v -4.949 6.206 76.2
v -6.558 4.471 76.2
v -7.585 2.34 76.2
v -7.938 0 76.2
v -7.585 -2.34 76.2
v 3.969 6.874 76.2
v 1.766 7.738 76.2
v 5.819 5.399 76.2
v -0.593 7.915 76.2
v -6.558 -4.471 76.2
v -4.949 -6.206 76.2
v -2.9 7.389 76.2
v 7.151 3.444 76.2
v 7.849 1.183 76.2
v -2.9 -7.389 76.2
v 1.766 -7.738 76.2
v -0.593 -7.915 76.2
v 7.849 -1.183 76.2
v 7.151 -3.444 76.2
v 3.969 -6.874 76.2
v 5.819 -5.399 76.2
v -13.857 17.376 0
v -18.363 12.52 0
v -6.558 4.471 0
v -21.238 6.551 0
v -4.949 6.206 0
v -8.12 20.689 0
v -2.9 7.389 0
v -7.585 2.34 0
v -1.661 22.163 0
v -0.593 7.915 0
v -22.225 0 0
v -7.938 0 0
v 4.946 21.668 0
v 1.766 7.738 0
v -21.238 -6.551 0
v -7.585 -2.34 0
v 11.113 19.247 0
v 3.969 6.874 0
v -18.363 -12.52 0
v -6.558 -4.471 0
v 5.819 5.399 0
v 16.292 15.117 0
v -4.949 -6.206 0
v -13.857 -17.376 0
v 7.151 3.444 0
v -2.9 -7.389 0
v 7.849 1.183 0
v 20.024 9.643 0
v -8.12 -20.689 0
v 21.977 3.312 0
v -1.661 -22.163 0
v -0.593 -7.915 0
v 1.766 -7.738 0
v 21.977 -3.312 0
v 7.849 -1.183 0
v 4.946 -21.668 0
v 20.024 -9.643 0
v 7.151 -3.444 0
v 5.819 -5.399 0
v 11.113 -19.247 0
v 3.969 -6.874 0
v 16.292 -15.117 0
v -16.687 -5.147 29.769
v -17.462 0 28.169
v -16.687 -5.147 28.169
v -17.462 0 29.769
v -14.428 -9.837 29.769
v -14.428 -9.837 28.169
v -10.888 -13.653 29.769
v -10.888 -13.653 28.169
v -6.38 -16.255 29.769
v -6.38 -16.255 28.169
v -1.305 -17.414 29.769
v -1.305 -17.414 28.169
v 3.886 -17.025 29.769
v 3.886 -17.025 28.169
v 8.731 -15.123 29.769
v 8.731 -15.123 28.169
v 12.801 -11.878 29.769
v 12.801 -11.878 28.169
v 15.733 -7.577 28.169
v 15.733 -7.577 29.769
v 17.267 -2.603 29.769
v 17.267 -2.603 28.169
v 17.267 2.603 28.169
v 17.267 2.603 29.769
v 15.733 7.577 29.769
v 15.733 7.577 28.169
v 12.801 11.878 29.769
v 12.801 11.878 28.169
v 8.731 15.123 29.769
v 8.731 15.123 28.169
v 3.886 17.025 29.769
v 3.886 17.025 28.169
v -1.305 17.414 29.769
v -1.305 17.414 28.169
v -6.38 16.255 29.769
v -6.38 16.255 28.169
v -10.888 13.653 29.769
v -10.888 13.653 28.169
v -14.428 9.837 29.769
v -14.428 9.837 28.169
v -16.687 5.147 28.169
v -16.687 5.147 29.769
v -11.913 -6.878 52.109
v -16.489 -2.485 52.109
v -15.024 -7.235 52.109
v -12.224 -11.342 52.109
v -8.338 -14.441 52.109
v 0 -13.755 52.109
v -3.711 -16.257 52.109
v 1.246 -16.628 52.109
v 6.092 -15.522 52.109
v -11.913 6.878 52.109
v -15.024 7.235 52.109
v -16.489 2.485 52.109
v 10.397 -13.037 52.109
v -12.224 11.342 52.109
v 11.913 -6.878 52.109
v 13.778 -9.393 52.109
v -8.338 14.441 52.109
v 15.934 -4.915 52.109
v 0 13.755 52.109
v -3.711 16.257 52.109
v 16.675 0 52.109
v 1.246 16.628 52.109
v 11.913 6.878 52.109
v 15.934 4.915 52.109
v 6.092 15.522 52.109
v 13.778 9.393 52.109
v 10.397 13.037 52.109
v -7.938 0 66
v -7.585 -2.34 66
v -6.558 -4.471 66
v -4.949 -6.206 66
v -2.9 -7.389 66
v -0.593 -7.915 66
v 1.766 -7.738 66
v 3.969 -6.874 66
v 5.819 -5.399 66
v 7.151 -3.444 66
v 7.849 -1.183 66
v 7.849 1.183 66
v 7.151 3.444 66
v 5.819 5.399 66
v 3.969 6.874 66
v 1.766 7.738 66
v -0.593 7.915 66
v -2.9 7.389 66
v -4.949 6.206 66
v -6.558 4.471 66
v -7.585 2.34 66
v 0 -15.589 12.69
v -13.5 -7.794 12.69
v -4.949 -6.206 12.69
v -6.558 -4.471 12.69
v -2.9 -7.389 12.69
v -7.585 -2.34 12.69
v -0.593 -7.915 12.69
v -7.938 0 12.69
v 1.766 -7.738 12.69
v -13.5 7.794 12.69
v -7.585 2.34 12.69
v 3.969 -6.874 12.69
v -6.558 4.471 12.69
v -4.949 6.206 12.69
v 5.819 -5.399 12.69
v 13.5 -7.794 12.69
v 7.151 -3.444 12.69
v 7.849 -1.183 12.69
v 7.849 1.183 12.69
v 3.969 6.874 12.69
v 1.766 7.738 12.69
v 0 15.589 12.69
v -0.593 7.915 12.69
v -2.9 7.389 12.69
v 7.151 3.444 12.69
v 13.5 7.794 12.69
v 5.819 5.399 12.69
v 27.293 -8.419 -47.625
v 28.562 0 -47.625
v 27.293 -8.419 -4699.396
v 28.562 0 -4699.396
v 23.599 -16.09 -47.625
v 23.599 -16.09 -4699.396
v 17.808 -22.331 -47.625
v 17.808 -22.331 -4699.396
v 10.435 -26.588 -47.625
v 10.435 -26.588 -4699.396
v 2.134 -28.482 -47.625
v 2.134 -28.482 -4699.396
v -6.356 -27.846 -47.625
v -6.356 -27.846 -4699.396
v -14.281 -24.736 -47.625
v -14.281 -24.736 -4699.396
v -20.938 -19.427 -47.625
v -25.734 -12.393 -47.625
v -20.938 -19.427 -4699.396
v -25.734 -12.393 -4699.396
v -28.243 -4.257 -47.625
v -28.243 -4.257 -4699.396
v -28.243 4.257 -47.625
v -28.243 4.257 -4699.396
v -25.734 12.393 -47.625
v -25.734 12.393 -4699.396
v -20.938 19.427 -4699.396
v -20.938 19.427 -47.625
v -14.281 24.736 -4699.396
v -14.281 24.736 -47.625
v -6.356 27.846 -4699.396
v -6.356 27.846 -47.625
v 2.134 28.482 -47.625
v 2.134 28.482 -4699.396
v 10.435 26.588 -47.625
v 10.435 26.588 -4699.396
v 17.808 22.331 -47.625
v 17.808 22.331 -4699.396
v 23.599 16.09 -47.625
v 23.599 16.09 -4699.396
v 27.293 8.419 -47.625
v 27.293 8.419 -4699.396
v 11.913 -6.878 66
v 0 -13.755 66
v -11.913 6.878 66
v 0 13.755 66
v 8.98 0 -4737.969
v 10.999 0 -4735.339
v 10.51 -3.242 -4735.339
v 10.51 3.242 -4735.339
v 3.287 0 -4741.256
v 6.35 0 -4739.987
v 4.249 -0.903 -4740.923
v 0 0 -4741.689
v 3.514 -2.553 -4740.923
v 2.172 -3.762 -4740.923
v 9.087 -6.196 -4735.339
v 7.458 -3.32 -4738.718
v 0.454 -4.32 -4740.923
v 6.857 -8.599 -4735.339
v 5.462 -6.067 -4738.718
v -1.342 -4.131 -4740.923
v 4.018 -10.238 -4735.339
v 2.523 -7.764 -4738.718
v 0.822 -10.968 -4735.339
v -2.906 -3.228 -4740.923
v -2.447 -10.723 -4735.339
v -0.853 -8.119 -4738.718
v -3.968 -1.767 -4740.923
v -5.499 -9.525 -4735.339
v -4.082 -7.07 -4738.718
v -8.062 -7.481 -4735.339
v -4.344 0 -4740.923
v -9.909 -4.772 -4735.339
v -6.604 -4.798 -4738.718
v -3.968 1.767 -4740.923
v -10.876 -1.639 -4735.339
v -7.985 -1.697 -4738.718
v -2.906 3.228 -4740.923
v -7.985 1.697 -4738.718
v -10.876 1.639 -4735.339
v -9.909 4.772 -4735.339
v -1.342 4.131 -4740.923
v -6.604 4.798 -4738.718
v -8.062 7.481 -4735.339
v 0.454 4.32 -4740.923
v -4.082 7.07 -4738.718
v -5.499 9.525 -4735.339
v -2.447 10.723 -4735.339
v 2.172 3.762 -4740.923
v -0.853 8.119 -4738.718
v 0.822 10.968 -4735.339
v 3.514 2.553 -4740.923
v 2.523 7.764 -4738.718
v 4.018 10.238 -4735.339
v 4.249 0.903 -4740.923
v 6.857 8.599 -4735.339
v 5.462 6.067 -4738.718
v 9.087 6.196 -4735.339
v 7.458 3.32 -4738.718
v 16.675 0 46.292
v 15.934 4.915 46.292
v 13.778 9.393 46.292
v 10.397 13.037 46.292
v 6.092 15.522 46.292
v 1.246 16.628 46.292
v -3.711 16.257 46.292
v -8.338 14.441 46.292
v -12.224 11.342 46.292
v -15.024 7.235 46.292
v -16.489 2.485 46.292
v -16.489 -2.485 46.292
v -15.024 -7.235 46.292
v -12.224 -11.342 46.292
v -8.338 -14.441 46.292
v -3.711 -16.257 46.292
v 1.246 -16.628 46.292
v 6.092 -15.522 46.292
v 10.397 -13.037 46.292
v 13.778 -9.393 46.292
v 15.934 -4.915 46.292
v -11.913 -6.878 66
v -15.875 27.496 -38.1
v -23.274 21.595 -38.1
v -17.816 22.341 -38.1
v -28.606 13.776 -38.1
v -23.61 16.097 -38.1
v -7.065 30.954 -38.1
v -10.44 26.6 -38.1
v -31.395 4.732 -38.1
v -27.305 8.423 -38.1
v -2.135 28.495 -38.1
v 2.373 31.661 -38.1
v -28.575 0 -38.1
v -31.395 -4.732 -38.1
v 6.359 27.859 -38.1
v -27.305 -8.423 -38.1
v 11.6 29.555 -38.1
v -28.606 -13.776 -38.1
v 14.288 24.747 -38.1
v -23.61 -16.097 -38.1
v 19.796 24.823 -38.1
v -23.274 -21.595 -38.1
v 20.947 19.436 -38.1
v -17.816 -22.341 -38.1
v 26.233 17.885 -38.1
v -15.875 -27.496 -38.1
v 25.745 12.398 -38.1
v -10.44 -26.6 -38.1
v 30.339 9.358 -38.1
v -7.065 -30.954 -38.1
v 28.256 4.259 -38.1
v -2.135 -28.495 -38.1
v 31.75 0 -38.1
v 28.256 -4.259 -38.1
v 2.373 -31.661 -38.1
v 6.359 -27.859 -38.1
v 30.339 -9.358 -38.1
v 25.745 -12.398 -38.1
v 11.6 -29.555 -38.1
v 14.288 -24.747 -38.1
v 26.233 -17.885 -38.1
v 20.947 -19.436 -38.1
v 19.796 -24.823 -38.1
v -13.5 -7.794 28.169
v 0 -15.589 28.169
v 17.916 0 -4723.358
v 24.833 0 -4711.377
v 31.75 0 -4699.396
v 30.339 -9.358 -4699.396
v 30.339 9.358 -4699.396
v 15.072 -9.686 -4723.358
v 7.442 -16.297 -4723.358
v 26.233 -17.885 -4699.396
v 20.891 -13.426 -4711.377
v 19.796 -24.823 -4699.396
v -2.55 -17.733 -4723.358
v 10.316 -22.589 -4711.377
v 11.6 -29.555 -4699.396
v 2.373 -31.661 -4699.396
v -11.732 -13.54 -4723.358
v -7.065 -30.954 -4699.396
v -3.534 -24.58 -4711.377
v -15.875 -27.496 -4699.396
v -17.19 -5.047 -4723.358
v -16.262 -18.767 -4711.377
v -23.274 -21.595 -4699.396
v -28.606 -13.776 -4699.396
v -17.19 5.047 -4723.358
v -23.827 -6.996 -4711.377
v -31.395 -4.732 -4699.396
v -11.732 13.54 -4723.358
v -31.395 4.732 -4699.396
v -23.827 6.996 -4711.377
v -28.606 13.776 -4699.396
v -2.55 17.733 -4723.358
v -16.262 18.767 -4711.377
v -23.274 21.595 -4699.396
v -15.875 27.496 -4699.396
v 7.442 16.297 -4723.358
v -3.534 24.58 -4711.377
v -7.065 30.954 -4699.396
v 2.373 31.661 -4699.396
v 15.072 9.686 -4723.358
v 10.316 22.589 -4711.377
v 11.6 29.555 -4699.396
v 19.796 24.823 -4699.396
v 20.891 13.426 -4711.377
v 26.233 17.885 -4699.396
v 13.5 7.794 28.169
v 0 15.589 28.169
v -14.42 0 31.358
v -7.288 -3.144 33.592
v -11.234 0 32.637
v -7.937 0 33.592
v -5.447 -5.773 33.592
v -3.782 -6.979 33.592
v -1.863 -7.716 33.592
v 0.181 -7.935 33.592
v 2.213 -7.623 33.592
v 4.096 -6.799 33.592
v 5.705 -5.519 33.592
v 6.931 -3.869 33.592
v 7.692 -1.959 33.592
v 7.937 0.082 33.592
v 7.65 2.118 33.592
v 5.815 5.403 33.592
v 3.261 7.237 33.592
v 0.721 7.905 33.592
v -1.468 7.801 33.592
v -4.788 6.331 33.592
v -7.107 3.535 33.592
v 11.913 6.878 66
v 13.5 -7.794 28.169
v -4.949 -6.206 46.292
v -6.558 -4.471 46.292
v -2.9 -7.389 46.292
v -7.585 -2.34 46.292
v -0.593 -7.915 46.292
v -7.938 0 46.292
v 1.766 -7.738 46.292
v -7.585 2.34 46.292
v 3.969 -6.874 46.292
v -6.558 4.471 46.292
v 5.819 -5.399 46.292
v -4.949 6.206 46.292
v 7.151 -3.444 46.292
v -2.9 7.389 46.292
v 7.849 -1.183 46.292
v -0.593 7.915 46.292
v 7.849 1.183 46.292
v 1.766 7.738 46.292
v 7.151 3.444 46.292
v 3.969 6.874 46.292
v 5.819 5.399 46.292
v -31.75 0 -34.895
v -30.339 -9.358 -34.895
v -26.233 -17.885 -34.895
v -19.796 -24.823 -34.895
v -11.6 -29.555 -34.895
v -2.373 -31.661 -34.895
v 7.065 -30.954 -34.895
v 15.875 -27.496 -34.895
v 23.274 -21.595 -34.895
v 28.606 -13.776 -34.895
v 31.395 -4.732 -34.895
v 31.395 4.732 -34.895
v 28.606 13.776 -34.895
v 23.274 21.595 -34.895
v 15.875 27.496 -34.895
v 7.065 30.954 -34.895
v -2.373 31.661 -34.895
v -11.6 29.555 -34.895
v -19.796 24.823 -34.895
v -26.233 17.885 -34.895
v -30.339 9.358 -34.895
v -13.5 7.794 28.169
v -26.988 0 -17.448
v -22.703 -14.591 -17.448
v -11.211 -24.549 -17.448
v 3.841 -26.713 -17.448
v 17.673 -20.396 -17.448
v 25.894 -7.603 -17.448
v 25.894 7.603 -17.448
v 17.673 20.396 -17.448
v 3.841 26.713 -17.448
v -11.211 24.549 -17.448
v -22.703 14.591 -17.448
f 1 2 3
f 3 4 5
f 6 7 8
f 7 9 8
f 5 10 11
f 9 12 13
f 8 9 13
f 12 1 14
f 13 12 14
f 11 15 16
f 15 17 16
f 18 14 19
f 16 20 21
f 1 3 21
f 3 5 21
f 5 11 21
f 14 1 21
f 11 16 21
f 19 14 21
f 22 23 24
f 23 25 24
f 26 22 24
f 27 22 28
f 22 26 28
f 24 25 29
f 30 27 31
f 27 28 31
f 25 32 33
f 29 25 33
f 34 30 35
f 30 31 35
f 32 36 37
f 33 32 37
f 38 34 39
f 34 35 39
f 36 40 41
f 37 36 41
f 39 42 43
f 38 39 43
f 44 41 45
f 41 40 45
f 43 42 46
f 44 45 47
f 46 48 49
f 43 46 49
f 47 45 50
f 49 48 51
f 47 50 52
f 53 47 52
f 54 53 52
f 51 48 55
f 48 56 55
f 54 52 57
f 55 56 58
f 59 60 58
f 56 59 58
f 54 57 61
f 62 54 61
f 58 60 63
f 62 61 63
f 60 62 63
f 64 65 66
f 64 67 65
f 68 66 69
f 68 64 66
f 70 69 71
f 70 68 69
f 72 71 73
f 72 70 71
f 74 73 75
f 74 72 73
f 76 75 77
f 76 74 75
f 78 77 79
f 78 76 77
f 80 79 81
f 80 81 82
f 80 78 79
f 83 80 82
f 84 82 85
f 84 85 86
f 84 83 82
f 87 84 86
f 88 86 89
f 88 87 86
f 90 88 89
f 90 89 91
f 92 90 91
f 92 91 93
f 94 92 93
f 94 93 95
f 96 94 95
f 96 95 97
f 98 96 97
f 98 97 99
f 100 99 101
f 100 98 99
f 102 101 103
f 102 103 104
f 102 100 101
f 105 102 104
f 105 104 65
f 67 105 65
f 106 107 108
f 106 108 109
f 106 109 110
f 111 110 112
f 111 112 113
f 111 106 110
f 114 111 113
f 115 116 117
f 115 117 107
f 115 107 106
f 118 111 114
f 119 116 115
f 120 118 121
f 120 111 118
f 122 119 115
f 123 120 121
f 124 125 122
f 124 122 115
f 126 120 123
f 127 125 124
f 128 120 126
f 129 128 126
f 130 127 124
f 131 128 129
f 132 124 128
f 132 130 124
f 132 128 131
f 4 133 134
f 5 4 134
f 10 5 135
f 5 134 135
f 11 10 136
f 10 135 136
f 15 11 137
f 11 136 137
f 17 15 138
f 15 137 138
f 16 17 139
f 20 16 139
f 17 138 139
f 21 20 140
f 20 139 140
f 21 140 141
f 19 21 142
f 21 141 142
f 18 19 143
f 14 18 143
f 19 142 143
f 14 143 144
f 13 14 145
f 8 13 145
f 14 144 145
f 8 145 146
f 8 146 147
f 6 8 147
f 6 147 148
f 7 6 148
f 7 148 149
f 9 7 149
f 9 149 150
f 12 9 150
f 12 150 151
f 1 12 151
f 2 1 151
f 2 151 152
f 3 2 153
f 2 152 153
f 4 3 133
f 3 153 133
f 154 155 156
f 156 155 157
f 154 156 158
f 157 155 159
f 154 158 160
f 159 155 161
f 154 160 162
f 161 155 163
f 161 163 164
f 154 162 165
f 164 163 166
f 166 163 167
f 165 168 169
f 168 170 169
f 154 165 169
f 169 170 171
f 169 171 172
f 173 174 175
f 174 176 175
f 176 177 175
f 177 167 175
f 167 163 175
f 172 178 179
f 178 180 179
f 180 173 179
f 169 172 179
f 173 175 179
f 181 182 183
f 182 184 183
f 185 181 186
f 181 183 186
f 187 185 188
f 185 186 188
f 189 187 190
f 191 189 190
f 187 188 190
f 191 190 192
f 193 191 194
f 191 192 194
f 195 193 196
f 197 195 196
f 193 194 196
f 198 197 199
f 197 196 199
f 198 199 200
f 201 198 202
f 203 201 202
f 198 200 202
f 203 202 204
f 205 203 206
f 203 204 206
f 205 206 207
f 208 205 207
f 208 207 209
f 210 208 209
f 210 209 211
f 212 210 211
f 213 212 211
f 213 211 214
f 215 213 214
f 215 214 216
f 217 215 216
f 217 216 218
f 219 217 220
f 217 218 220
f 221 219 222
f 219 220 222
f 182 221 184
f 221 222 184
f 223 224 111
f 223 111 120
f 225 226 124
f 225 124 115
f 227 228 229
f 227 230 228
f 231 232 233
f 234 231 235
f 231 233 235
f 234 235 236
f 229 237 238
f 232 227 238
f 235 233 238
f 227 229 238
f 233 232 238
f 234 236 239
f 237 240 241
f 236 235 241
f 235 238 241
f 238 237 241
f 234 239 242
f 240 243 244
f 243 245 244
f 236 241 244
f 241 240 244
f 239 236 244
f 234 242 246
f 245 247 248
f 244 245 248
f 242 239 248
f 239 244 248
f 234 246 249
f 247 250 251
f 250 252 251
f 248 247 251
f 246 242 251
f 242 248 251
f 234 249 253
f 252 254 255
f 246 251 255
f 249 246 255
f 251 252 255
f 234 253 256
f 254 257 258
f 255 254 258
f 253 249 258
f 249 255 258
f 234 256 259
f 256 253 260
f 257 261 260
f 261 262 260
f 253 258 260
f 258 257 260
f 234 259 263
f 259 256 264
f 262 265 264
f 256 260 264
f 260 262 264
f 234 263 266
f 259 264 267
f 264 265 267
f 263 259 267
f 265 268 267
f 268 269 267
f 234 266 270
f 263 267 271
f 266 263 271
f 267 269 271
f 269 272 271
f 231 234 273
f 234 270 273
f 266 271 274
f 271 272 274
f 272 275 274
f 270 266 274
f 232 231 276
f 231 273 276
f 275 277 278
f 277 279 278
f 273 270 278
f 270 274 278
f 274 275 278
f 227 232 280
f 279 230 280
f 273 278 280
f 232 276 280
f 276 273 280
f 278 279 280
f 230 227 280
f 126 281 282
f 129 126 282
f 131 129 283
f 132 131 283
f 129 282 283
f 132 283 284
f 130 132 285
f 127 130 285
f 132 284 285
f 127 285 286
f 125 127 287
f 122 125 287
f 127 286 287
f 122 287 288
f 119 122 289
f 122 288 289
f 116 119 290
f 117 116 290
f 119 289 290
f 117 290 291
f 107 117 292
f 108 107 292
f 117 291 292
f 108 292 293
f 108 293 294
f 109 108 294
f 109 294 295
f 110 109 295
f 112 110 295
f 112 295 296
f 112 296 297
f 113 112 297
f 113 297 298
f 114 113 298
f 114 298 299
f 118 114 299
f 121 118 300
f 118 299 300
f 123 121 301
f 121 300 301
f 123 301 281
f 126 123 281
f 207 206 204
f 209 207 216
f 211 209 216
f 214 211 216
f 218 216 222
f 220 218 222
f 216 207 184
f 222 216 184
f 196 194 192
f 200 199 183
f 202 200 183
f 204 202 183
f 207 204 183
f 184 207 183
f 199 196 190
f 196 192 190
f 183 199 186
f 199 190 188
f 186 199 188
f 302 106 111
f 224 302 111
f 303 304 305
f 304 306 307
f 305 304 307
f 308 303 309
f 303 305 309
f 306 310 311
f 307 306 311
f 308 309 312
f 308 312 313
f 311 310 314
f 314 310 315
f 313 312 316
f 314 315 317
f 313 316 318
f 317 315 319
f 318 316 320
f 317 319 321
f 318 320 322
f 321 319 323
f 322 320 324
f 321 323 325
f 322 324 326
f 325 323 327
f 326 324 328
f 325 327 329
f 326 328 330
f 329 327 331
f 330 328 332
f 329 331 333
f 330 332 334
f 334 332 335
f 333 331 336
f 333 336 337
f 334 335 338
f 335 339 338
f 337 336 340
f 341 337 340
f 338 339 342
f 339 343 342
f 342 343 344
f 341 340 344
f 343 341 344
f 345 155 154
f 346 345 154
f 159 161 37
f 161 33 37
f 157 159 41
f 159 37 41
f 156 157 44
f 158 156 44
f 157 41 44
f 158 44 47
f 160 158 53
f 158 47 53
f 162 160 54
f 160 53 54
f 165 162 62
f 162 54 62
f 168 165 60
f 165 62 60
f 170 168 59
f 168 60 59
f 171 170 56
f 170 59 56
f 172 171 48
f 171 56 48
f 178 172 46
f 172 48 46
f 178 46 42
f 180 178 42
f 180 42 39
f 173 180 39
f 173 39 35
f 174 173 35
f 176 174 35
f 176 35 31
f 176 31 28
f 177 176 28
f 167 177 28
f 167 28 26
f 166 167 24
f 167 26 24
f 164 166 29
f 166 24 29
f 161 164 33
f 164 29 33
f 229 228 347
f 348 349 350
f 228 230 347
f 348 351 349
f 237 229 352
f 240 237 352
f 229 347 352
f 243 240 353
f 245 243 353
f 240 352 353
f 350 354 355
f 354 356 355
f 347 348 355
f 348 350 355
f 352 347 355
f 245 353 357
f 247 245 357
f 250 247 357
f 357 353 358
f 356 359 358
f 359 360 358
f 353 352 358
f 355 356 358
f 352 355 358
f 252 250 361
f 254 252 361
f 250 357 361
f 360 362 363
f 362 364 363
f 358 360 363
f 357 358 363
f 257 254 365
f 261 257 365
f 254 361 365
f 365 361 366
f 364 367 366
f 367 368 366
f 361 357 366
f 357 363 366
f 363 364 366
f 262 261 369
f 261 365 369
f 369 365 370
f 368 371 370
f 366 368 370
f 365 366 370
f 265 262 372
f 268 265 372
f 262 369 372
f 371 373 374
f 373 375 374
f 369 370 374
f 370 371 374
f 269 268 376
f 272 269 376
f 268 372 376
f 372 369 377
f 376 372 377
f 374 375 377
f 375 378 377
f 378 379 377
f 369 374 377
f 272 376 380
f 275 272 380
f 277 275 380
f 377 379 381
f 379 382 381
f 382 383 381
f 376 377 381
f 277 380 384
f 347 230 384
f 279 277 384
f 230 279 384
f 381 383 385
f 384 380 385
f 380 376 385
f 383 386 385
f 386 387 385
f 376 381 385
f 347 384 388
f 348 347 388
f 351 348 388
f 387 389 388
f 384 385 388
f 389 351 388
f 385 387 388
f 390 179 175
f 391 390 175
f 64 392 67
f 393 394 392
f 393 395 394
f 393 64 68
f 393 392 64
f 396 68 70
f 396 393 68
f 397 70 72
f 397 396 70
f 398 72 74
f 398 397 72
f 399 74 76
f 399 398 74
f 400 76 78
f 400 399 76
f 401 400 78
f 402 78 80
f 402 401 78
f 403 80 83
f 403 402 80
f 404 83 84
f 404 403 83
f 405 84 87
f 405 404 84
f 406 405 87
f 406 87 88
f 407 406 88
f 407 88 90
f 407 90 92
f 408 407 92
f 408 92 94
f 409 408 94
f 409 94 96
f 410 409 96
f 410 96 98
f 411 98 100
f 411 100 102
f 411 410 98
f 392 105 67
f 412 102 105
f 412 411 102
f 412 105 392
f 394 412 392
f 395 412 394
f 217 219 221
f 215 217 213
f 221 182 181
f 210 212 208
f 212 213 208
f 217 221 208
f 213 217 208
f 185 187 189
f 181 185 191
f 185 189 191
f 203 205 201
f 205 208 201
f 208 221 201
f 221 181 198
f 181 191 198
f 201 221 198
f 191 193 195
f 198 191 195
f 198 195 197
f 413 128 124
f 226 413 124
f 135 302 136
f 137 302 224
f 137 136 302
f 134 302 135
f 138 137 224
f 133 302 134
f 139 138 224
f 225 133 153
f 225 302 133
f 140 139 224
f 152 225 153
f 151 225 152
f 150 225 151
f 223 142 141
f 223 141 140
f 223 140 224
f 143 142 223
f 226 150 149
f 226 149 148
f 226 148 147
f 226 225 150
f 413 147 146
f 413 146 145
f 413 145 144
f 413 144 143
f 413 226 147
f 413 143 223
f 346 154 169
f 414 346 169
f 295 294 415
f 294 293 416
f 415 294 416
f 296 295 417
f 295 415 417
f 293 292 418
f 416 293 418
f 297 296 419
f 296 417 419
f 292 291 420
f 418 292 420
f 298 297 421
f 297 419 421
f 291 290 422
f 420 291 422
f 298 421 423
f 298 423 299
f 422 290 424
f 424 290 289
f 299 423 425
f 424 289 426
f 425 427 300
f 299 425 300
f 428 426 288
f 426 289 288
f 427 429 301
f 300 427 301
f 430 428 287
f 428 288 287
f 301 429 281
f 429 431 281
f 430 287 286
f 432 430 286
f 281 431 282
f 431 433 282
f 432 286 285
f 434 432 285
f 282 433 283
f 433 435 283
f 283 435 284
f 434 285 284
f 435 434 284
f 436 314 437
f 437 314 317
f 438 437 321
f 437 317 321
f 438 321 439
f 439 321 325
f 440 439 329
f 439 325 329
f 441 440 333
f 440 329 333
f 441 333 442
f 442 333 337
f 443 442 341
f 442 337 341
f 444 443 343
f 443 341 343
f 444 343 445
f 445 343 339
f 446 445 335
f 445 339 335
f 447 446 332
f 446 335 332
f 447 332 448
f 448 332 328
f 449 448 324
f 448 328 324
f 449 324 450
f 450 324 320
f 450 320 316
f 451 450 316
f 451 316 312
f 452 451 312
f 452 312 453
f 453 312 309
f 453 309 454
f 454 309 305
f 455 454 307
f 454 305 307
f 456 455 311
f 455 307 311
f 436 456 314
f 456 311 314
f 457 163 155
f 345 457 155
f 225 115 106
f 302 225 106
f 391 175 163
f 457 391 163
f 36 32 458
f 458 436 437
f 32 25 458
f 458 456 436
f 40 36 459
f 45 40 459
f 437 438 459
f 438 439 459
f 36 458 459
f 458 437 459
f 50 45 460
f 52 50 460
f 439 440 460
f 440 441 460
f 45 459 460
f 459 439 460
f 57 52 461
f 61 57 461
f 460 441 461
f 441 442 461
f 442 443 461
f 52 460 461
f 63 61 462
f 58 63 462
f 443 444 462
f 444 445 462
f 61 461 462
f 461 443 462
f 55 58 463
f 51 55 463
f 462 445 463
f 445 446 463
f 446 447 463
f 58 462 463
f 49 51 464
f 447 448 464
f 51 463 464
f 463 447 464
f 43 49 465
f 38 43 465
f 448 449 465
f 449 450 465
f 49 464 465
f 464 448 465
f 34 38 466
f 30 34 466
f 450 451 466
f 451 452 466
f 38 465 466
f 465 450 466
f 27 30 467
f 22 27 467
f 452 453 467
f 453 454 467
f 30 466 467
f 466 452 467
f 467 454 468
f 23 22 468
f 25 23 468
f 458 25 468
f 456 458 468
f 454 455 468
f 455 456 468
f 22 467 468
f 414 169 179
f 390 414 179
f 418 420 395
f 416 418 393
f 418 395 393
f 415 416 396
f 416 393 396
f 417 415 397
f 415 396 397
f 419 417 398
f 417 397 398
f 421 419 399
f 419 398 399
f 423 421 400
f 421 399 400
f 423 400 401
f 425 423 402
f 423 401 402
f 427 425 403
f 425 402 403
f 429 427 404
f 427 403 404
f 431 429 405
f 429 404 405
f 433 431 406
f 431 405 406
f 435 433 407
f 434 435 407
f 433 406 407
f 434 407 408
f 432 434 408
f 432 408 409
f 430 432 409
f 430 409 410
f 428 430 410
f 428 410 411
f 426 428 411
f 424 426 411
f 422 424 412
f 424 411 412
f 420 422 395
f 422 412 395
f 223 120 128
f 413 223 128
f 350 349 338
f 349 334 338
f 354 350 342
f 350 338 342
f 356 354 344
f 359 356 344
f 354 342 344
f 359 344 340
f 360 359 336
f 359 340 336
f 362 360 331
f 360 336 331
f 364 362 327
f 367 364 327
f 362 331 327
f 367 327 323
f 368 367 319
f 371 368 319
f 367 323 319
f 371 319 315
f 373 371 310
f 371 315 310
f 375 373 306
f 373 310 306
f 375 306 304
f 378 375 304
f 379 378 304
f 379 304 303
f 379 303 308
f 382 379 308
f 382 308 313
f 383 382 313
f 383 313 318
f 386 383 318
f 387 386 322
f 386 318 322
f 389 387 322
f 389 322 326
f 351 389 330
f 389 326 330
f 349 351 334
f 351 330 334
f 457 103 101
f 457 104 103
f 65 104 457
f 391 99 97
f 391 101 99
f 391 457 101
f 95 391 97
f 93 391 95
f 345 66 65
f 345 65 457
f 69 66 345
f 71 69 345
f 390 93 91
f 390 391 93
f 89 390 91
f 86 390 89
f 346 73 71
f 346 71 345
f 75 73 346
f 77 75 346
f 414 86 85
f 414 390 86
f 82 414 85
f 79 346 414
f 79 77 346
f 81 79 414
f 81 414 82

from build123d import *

# Parameters (mm, degrees)
BOSS_REVOLVE3_START         = 12.690475
BOSS_REVOLVE3_OUTLINE_R     = 7.9375
BOSS_REVOLVE3_DEPTH         = 15.478125
BOSS_REVOLVE3_START_2       = 46.292398399
BOSS_REVOLVE3_2_OUTLINE_R   = 16.6751
BOSS_REVOLVE3_2_OUTLINE_R_2 = 7.9375
BOSS_REVOLVE3_2_DEPTH       = 5.8166
BOSS_EXTRUDE2_DEPTH         = 13.890625


# Read off the part's stored shape, not the designer's step: Boss-Revolve3
with BuildPart() as part:
    # Sketch1 → Base-Revolve (revolve)
    with BuildSketch(Plane(origin=(0, 0, 0), x_dir=(0, 0, -1), z_dir=(1, 0, 0)), mode=Mode.PRIVATE) as base_revolve_sk:
        Polygon((-76.2, 0), (-76.2, 7.9375), (0, 7.9375), (0, 22.225), (34.895210283, 31.75), (38.1, 28.575), (47.625, 28.575), (47.625, 0), align=None)
    revolve(base_revolve_sk.sketch.rotate(Axis((0, 0, 0), (0, 0, 1)), 90), axis=Axis((0, 0, 0), (0, 0, 1)))

    # Sketch3 → Boss-Revolve2 (revolve)
    with BuildSketch(Plane(origin=(0, 0, 0), x_dir=(0, 0, -1), z_dir=(1, 0, 0)), mode=Mode.PRIVATE) as boss_revolve2_sk:
        with BuildLine():
            Line((-28.1686, 0), (-28.1686, 17.4625))
            Line((-28.1686, 17.4625), (-29.7688, 17.4625))
            ThreePointArc((-29.7688, 17.4625), (-33.309963658, 9.048473715), (-34.5186, 0))
            Line((-34.5186, 0), (-28.1686, 0))
        make_face()
    revolve(boss_revolve2_sk.sketch.rotate(Axis((0, 0, 0), (0, 0, 1)), 90), axis=Axis((0, 0, 0), (0, 0, 1)))

    # Sketch2 → Boss-Revolve1 (revolve)
    with BuildSketch(Plane(origin=(0, 0, 0), x_dir=(0, 0, -1), z_dir=(1, 0, 0)), mode=Mode.PRIVATE) as boss_revolve1_sk:
        with BuildLine():
            Line((38.1, 31.75), (38.1, 28.5623))
            Line((38.1, 28.5623), (4699.39623629, 28.5623))
            Line((4699.39623629, 28.5623), (4699.39623629, 0))
            Line((4699.39623629, 0), (4741.68884943, 0))
            ThreePointArc((4741.68884943, 0), (4739.987372059, 6.35), (4735.33884943, 10.998522628))
            Line((4735.33884943, 10.998522628), (4699.39623629, 31.75))
            Line((4699.39623629, 31.75), (38.1, 31.75))
        make_face()
    revolve(boss_revolve1_sk.sketch.rotate(Axis((0, 0, 29.7434), (0, 0, -1)), 90), axis=Axis((0, 0, 29.7434), (0, 0, -1)))

    # Boss-Revolve3 outline → Boss-Revolve3 (add)
    with BuildSketch(Plane.XY.offset(BOSS_REVOLVE3_START)):
        Polygon((0, -15.588572738), (13.5001, -7.794286369), (13.5001, 7.794286369), (0, 15.588572738), (-13.5001, 7.794286369), (-13.5001, -7.794286369), align=None)
        Circle(BOSS_REVOLVE3_OUTLINE_R, mode=Mode.SUBTRACT)
    extrude(amount=BOSS_REVOLVE3_DEPTH)

    # Boss-Revolve3 2 outline → Boss-Revolve3 2 (add)
    with BuildSketch(Plane.XY.offset(BOSS_REVOLVE3_START_2)):
        Circle(BOSS_REVOLVE3_2_OUTLINE_R)
        Circle(BOSS_REVOLVE3_2_OUTLINE_R_2, mode=Mode.SUBTRACT)
    extrude(amount=BOSS_REVOLVE3_2_DEPTH)

    # Sketch6 → Boss-Extrude2 (add)
    with BuildSketch(Plane.XY.offset(52.108998399)):
        Polygon((0, -13.755485633), (11.9126, -6.877742817), (11.9126, 6.877742817), (0, 13.755485633), (-11.9126, 6.877742817), (-11.9126, -6.877742817), align=None)
    extrude(amount=BOSS_EXTRUDE2_DEPTH)


solid = part.part
